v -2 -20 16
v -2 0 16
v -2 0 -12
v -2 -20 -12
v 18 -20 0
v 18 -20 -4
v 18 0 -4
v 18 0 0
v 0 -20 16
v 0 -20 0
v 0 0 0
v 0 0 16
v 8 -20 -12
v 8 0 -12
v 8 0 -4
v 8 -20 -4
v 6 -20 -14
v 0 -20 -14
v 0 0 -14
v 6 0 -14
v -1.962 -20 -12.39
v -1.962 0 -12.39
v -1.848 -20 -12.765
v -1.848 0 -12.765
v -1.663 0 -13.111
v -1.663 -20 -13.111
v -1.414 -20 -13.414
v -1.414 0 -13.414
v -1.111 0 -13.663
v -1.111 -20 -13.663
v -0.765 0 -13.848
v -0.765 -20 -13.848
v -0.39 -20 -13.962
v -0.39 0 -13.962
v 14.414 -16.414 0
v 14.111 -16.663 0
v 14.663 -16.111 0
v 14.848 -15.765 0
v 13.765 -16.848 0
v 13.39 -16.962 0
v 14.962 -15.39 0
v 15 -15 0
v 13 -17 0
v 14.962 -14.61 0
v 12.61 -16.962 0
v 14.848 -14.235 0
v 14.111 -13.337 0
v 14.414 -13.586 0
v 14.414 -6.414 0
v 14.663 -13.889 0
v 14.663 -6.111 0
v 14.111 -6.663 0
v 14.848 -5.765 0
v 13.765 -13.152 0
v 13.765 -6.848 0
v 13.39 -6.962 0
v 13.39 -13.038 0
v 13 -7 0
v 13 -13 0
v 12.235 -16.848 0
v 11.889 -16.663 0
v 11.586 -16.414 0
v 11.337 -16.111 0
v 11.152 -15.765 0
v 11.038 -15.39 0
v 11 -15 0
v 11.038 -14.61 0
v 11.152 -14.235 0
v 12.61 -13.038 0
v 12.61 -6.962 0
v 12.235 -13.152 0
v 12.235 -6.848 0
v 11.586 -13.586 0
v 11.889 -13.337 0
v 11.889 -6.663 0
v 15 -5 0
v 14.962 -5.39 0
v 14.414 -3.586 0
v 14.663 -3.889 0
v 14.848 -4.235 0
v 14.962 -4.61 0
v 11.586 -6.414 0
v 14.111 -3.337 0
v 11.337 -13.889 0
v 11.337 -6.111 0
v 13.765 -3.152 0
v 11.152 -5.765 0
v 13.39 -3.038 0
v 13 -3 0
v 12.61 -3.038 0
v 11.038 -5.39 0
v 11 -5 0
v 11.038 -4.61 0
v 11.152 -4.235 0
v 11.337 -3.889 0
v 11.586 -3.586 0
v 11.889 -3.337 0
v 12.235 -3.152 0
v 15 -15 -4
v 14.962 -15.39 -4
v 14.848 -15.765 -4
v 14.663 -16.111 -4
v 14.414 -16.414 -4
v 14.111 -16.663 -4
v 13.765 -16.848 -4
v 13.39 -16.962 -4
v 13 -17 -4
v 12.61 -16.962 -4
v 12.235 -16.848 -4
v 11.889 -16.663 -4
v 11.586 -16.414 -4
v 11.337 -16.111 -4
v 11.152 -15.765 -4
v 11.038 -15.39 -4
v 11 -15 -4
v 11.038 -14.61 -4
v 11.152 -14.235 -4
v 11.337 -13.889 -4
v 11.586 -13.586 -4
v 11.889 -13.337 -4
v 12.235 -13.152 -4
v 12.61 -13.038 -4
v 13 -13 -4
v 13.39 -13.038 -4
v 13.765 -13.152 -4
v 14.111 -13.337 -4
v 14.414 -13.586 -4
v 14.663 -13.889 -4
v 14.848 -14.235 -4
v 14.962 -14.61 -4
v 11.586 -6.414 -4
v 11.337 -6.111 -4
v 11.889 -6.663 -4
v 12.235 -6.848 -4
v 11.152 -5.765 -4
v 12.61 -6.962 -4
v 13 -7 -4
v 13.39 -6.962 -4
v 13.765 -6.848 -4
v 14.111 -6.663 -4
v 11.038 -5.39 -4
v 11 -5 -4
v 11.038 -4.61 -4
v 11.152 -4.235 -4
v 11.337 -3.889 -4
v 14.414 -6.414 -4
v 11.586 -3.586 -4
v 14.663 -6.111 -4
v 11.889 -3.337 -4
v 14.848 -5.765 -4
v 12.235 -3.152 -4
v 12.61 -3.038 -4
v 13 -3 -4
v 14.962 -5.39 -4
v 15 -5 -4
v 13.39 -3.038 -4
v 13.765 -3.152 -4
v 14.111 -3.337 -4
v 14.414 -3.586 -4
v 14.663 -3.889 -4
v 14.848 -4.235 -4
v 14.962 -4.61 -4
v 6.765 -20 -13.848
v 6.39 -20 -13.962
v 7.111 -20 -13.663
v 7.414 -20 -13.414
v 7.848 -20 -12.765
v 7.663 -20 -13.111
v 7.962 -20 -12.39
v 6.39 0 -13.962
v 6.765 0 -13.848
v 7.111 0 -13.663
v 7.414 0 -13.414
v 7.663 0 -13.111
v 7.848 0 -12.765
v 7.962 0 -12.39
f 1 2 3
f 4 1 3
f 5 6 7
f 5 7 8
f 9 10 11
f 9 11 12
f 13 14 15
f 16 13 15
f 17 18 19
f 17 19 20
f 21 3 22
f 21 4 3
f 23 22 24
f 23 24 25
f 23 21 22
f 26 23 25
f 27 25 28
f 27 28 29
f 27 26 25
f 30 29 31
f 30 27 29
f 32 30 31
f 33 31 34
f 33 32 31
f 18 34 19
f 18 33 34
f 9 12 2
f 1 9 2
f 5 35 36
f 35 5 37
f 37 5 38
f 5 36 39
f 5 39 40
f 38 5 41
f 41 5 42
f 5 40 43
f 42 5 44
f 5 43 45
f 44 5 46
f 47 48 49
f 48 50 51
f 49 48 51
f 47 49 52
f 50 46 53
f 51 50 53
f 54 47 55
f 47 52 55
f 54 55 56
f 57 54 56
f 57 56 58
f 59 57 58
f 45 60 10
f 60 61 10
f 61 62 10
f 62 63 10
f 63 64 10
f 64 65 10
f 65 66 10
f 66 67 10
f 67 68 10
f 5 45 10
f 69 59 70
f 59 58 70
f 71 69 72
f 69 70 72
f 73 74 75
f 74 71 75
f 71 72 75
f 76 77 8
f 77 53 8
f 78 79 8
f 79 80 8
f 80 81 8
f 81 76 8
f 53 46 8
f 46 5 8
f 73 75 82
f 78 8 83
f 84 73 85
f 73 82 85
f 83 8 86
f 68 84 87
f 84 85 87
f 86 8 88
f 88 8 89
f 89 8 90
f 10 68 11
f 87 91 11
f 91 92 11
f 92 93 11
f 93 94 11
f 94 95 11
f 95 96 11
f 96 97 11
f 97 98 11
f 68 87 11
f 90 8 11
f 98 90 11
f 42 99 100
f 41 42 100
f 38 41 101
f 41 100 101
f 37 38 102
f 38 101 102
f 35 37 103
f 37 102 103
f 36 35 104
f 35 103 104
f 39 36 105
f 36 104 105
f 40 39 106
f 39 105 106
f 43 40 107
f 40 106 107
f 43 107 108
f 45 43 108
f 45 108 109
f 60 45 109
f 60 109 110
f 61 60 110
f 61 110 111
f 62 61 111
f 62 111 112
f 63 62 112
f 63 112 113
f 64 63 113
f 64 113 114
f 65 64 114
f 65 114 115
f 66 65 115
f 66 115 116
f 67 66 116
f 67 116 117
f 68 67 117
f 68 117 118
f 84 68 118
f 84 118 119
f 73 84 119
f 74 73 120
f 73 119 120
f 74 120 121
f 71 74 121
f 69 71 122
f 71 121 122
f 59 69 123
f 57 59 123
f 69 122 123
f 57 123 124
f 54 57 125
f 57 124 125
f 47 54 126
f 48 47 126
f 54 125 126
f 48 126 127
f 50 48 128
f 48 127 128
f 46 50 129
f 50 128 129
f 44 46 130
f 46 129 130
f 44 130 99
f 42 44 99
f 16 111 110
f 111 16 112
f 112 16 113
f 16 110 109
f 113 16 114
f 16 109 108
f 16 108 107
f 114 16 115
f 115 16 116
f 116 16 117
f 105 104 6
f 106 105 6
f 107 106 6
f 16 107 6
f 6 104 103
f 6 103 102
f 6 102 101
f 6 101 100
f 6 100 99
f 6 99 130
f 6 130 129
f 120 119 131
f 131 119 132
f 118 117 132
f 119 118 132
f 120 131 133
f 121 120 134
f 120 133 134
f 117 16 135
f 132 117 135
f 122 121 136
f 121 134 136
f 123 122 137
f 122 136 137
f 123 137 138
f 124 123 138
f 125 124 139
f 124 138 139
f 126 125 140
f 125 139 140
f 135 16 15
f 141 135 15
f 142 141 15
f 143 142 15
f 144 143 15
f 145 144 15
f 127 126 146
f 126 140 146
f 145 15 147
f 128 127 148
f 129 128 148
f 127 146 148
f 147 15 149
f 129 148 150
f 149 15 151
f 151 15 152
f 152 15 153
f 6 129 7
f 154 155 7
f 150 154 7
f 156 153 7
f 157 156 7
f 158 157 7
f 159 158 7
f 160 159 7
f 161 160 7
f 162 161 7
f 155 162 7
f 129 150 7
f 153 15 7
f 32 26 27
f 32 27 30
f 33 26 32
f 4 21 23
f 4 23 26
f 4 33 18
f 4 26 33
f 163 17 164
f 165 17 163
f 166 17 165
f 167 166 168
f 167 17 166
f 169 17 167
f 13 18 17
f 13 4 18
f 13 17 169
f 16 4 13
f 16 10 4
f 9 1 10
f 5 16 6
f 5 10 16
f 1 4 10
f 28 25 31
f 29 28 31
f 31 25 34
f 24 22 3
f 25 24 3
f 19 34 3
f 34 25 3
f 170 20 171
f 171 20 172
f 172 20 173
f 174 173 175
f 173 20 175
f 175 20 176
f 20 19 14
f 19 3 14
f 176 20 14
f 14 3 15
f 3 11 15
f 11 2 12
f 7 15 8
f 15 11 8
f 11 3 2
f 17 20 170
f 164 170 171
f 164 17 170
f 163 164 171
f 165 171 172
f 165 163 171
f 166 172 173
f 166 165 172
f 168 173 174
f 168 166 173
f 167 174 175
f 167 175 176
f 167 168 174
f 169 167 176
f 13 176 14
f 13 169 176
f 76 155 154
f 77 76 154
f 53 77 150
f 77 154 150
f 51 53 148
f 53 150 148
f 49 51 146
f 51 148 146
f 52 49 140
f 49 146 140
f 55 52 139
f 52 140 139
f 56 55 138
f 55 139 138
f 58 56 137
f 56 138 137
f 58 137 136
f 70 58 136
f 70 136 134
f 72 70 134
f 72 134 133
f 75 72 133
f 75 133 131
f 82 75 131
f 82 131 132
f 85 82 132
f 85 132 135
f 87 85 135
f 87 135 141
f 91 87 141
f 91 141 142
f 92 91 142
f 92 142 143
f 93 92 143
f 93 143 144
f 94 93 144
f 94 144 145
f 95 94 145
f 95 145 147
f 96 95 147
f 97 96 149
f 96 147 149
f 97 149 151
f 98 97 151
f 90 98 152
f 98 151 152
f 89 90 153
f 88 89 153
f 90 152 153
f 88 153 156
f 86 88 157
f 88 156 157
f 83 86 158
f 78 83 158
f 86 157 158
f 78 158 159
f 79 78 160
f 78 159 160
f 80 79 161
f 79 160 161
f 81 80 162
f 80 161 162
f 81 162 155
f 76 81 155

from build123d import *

# Parameters (mm, degrees)
F1_DEPTH = 20
F2_R     = 2
F3_DEPTH = 25
F4_R     = 2
F5_R     = 2


with BuildPart() as f1:
    # F0 (on Front) → F1 (new body)
    with BuildSketch(Plane.XZ):
        Polygon((18, 0), (0, 0), (0, 16), (-2, 16), (-2, -14), (8, -14), (8, -4), (18, -4), align=None)
    extrude(amount=F1_DEPTH)

    # F2 (on face) → F3 (cut)
    with BuildSketch(Plane(origin=(0, 0, -4), x_dir=(1, 0, 0), z_dir=(0, 0, -1))):
        with Locations((13, 15)):
            Circle(F2_R)
        with Locations((13, 5)):
            Circle(F2_R)
    extrude(amount=-F3_DEPTH, mode=Mode.SUBTRACT)

    # F4
    f4_edges = [f1.edges().sort_by_distance(p)[0] for p in [
        (-2, -10, -14),
    ]]
    fillet(f4_edges, radius=F4_R)

    # F5
    f5_edges = [f1.edges().sort_by_distance(p)[0] for p in [
        (8, -10, -14),
    ]]
    fillet(f5_edges, radius=F5_R)


solid = f1.part
